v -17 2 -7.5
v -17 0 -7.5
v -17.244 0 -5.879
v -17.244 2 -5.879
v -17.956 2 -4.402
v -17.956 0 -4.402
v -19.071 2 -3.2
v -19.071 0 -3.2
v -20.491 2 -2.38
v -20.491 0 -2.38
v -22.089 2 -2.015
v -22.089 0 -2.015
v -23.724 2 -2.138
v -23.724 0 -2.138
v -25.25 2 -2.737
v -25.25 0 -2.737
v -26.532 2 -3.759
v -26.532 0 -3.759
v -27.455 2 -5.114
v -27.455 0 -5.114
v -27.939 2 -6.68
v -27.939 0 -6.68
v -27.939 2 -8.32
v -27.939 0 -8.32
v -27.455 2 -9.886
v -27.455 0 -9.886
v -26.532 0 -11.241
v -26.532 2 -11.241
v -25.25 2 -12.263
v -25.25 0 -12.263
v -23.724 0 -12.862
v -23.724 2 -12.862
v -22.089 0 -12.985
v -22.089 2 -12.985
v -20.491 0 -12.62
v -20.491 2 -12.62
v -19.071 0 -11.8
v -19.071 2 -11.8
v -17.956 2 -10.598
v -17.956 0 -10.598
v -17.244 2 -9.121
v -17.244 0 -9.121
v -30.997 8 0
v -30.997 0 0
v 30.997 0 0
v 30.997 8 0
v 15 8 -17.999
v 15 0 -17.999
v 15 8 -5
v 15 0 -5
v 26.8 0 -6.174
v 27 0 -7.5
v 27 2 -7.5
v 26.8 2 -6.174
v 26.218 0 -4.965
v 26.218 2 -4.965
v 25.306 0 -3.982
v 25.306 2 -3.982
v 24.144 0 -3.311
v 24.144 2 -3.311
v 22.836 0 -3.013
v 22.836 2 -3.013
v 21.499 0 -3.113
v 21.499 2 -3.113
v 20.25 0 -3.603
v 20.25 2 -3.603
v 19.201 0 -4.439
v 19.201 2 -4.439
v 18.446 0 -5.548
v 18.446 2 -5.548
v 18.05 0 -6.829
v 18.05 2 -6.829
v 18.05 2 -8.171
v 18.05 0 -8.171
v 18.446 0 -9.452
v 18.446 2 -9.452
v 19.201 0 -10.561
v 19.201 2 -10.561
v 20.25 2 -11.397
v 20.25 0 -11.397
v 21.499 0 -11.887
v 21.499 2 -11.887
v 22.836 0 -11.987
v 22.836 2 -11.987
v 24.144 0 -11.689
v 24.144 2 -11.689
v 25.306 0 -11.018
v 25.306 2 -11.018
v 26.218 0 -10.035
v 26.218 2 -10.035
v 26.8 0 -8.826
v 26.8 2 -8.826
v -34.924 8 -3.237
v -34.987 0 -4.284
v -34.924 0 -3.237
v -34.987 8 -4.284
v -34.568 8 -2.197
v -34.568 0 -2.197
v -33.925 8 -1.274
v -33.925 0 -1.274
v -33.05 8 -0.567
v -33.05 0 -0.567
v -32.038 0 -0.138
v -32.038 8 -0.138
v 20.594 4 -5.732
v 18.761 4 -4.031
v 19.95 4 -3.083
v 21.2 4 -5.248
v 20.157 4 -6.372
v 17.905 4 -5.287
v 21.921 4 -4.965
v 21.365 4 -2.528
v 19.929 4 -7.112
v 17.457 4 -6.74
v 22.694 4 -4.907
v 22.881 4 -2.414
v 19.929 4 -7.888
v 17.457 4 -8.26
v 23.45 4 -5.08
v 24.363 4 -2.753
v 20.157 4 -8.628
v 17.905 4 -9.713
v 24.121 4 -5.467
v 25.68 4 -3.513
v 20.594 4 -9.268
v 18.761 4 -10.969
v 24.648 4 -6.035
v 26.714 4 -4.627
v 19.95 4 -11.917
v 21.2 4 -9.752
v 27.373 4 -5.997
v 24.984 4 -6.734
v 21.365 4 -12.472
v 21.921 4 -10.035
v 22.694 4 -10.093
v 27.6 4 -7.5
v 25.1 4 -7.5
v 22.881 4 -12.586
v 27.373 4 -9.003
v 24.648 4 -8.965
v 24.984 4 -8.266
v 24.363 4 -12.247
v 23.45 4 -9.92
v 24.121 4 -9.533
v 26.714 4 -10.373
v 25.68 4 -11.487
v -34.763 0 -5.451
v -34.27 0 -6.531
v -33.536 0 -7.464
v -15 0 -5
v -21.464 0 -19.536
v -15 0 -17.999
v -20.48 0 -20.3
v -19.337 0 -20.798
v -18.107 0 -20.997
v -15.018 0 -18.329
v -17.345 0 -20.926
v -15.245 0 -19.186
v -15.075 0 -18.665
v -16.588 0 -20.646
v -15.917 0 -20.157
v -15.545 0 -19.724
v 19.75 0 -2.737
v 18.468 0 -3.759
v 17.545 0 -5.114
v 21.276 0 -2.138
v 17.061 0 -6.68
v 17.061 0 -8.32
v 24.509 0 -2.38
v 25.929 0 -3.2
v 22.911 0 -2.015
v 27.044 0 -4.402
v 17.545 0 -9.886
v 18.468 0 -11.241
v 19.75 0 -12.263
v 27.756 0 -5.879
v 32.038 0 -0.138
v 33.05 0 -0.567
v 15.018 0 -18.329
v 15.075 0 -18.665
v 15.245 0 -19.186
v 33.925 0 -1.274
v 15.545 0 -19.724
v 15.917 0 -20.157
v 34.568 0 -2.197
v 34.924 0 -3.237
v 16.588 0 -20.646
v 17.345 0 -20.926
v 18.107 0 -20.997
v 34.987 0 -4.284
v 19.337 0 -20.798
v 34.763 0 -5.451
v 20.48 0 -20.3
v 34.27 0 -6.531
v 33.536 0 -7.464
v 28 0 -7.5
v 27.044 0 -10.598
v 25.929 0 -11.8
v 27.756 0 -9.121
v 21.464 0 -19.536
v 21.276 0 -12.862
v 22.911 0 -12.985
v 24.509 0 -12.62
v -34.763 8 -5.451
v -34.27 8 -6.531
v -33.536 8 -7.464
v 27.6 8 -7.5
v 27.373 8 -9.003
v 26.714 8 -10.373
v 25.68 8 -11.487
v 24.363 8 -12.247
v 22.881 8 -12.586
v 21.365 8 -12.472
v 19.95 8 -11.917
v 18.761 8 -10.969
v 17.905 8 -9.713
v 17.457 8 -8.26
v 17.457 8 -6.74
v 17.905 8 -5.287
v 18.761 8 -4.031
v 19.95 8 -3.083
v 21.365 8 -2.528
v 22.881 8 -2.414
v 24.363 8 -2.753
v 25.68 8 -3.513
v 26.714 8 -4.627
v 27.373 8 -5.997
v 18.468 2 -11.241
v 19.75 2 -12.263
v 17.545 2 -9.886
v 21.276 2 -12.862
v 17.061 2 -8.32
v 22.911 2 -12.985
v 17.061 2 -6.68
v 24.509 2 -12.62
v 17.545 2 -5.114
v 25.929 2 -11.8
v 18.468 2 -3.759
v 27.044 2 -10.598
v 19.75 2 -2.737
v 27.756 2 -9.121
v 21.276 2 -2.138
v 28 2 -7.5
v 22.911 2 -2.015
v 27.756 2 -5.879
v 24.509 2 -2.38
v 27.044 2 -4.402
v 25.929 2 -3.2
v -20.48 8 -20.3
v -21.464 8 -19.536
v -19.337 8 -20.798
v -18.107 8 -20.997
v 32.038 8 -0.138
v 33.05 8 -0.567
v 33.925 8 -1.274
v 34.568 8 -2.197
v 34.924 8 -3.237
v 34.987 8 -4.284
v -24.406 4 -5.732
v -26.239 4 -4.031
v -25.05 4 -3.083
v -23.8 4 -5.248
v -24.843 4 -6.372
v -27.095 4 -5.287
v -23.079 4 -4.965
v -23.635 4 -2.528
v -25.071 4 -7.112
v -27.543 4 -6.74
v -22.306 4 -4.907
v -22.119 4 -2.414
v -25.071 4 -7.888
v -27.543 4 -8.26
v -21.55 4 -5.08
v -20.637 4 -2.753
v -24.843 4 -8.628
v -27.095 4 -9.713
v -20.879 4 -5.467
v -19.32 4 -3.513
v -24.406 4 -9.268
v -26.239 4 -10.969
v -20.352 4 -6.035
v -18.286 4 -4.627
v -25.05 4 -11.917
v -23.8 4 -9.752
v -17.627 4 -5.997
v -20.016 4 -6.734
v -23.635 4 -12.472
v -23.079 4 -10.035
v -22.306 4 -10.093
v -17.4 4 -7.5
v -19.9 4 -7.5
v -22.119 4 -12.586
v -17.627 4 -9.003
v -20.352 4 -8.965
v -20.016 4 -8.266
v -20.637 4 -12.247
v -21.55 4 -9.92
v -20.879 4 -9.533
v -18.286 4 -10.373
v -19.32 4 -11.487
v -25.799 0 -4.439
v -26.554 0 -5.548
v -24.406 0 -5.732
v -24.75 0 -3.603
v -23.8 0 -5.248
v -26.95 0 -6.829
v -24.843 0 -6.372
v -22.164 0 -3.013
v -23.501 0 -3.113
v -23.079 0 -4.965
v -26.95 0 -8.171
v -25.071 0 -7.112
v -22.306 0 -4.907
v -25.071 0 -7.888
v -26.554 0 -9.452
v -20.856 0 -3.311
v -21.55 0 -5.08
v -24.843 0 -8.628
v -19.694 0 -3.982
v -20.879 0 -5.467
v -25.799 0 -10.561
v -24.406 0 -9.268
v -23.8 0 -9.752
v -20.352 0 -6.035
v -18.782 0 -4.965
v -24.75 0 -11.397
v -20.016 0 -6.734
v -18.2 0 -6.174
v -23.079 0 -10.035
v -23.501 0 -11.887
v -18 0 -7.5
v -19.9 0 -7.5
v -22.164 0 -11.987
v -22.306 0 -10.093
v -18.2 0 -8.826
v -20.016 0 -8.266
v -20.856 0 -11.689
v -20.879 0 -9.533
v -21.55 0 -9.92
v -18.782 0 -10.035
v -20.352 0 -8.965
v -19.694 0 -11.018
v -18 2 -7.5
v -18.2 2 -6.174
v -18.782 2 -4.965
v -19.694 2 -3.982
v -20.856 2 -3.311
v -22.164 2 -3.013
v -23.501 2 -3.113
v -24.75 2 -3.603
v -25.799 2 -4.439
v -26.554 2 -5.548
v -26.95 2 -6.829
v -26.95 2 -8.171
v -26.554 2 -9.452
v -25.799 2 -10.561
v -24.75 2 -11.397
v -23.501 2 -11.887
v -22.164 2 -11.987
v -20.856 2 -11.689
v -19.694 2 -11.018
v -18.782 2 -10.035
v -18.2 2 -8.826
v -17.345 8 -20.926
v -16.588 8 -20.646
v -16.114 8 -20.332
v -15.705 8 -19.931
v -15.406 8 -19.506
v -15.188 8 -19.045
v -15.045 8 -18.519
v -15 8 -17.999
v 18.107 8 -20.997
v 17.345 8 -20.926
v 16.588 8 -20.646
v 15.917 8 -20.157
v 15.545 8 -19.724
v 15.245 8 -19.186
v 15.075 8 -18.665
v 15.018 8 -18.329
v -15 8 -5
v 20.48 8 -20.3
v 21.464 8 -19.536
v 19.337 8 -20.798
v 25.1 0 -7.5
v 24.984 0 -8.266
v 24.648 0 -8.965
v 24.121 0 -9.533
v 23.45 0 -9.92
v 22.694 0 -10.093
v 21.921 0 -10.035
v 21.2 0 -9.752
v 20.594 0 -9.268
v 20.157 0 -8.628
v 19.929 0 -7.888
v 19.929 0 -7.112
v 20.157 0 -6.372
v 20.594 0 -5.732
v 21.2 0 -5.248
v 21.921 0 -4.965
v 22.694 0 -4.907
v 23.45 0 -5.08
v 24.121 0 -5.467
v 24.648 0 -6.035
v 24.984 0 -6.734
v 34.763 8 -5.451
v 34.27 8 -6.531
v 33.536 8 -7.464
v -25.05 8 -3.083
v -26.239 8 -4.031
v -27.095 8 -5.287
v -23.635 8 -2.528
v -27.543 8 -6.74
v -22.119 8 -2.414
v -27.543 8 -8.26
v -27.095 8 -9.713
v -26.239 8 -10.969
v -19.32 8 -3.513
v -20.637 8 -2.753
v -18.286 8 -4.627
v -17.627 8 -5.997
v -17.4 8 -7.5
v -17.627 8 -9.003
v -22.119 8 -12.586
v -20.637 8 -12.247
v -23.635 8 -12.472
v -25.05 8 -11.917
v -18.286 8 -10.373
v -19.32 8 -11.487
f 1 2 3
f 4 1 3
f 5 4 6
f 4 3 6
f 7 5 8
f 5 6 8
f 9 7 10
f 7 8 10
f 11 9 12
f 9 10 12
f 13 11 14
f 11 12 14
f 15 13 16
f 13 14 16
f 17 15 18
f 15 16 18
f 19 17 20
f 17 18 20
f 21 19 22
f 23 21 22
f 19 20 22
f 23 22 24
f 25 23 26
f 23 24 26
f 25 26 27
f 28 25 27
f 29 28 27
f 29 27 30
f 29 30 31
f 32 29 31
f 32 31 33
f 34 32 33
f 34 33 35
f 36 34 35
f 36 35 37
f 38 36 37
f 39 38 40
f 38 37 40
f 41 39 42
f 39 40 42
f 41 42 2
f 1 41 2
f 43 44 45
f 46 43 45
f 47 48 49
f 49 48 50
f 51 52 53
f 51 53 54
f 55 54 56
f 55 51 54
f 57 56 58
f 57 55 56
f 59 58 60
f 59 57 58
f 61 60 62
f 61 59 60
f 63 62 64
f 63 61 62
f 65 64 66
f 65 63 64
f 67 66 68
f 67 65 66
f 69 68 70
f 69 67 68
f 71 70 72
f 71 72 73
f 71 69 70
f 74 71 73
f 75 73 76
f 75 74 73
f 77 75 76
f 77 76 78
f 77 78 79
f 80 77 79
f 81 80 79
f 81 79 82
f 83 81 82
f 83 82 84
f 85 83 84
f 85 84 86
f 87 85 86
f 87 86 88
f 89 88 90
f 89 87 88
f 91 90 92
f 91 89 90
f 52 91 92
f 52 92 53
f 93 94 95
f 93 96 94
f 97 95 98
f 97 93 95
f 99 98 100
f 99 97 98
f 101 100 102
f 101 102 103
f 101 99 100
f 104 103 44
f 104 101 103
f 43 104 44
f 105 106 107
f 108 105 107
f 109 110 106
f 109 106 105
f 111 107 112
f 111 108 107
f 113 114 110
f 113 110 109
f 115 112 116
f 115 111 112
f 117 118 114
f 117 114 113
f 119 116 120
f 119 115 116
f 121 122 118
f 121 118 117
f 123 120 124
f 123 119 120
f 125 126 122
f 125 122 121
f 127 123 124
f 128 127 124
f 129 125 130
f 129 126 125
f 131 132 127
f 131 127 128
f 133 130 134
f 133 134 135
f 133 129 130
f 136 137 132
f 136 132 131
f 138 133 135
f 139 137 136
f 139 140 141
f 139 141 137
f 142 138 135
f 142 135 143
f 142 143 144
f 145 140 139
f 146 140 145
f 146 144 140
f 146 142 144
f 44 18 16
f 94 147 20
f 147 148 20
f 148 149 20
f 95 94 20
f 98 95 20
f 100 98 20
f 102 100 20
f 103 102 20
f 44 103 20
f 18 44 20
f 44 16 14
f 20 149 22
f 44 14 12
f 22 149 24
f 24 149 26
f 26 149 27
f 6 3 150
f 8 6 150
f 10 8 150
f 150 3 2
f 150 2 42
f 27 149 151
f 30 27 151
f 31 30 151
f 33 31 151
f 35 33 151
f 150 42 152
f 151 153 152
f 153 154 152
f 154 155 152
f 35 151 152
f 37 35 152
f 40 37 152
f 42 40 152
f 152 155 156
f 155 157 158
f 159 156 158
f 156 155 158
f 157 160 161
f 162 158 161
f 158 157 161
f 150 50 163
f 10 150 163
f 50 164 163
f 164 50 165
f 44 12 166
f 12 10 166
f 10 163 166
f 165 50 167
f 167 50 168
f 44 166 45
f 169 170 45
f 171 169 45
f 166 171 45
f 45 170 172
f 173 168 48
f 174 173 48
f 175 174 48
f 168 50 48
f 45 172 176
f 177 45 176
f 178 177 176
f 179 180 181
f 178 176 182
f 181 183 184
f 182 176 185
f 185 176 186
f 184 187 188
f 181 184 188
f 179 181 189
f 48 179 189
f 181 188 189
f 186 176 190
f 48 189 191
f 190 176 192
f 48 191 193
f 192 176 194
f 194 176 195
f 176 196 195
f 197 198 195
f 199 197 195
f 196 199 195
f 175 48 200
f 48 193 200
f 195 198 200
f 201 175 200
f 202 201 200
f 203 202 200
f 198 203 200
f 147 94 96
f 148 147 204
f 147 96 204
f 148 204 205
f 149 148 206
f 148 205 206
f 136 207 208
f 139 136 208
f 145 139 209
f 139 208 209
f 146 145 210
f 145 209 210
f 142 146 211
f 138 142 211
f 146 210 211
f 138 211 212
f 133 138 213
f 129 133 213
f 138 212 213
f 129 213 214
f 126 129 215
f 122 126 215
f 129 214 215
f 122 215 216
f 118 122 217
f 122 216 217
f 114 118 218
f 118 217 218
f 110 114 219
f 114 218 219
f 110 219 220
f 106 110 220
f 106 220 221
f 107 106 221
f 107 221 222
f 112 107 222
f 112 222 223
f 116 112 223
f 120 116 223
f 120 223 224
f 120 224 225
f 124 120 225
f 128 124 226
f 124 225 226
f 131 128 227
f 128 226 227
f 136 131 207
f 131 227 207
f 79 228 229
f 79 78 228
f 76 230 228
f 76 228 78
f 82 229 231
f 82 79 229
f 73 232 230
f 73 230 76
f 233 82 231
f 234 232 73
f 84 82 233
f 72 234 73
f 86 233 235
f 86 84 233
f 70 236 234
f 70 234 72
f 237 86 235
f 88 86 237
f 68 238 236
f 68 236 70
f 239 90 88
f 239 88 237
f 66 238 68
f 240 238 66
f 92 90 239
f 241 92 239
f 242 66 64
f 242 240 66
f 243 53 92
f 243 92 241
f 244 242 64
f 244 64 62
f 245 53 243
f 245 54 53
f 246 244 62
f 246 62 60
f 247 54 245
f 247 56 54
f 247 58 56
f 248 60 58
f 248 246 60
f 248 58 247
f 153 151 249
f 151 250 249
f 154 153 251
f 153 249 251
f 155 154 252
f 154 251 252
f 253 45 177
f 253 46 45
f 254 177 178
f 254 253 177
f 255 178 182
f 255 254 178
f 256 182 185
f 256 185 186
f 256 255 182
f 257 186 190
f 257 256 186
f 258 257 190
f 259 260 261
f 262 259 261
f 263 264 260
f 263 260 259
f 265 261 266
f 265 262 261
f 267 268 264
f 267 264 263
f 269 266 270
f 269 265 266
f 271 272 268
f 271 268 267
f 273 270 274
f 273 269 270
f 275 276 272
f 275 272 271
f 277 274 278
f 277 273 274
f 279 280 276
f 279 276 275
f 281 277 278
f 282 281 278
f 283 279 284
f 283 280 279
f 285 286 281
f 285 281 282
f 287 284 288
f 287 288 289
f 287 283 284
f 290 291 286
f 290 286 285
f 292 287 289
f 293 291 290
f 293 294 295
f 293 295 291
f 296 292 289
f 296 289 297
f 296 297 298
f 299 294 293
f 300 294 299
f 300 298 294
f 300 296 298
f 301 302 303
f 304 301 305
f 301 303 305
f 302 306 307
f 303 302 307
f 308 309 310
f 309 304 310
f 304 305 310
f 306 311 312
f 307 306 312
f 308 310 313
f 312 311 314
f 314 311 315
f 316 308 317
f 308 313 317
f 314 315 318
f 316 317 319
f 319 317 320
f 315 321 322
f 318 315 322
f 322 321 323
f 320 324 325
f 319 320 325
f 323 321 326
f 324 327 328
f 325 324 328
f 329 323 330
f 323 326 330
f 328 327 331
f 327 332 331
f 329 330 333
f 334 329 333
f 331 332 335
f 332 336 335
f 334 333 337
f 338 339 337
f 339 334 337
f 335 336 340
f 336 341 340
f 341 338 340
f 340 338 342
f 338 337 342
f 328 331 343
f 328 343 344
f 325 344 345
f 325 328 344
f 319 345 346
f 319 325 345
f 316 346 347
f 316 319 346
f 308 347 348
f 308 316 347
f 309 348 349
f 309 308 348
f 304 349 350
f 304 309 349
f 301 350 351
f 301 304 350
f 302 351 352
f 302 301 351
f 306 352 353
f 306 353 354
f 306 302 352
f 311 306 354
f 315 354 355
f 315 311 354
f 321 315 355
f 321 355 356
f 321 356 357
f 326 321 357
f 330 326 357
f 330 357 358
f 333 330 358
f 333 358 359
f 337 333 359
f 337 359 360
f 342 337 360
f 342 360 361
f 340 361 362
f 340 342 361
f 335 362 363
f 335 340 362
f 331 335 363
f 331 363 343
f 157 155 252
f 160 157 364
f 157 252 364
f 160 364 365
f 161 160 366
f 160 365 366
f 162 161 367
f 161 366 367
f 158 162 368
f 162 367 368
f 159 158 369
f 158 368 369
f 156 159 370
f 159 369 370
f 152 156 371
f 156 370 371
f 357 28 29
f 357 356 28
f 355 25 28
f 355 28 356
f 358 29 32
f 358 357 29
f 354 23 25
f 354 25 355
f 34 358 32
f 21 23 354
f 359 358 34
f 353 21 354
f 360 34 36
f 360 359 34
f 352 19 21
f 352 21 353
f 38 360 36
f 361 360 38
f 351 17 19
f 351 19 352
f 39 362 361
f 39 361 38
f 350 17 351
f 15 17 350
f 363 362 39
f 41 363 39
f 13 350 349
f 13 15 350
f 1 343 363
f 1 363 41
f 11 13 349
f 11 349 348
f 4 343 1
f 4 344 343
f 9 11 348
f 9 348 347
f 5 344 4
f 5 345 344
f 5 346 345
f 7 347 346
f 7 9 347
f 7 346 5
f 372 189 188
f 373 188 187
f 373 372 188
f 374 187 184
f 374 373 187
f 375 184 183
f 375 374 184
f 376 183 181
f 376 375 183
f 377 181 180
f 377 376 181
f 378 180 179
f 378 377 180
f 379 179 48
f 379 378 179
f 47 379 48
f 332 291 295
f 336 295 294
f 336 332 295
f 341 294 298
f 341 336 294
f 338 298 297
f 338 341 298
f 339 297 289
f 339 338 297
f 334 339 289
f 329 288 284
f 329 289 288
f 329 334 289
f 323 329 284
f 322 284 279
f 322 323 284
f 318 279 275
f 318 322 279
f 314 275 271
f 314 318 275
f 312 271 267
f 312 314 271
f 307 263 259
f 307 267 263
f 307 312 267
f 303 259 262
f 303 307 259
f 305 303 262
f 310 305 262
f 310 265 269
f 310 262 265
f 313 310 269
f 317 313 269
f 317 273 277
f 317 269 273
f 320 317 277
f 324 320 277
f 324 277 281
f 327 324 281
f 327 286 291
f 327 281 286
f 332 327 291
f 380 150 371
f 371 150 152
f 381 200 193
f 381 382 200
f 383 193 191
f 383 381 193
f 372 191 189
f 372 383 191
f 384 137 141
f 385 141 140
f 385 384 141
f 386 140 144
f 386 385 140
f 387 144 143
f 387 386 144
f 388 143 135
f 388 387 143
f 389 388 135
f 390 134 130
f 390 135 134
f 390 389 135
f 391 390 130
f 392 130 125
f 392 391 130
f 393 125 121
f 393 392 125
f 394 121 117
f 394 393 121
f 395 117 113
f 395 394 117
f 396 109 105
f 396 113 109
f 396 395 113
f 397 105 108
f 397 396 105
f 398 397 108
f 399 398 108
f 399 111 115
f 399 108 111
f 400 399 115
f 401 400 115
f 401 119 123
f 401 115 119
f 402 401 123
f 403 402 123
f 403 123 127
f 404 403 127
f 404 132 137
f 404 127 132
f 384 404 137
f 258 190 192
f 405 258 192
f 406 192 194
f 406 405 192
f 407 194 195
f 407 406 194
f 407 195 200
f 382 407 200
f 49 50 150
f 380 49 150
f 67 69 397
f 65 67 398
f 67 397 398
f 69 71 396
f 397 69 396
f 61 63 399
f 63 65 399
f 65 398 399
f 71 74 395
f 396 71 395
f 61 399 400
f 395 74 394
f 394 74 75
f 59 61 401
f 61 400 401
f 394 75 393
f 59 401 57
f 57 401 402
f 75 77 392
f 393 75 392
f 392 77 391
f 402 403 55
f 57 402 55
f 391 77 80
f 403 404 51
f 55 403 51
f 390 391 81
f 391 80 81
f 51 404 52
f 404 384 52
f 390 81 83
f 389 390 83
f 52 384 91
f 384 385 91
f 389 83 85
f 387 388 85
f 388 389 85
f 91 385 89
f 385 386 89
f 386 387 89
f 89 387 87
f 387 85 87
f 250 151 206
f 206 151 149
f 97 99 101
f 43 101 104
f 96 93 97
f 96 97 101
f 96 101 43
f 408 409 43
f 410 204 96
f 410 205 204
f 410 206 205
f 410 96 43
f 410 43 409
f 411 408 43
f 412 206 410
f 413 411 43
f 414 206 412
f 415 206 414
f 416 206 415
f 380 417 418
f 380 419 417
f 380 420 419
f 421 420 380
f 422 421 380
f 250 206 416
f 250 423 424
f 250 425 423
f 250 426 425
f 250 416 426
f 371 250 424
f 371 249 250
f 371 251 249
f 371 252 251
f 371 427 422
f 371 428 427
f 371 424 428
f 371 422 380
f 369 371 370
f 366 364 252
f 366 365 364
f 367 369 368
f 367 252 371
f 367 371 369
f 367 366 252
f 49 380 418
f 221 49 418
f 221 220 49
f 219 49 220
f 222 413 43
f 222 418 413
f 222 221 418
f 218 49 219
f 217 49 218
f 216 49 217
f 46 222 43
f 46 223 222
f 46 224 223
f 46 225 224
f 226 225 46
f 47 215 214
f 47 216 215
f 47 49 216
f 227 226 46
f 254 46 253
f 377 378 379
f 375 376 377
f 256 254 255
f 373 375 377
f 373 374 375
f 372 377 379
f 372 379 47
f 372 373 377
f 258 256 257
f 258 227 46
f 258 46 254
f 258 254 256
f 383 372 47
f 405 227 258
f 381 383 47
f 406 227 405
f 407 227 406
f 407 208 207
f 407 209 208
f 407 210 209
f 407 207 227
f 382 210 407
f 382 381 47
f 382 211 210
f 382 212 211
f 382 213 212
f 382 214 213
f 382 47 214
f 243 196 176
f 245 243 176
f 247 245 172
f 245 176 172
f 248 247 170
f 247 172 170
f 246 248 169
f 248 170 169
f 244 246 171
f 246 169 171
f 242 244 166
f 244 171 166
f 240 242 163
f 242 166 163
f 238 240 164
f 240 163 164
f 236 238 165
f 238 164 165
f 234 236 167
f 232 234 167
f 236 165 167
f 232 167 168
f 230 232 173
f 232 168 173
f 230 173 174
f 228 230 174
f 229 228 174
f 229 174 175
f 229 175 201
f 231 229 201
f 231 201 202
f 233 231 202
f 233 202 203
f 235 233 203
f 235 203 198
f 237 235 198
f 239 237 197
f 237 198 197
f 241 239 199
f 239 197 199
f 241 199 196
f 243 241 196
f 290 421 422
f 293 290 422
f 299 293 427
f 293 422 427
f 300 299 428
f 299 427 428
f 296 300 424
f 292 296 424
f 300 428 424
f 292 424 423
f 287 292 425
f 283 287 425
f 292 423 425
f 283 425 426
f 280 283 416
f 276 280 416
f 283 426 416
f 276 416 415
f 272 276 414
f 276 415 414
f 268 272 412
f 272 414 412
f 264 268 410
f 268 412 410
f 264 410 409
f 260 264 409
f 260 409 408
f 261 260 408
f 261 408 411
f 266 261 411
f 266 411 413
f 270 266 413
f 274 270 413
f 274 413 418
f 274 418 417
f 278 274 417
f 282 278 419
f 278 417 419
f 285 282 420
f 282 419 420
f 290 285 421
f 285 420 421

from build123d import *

# Parameters (mm, degrees)
ESQUISSE1_R             = 2.6
BOSS_EXTRU_1_DEPTH      = 8
ESQUISSE3_R             = 5.1
ENL_V_MAT_EXTRU_2_DEPTH = 4
ESQUISSE4_R             = 5.5
ESQUISSE4_R_2           = 4.5
ENL_V_MAT_EXTRU_3_DEPTH = 2
CONG_1_R                = 5
CONG_2_R                = 3
CONG_3_R                = 4


with BuildPart() as part:
    # Esquisse1 → Boss.-Extru.1 (new body)
    with BuildSketch(Plane(origin=(0, 0, 0), x_dir=(1, 0, 0), z_dir=(0, 1, 0))):
        Polygon((-35, 0), (35, 0), (35, 6), (20, 21), (15, 21), (15, 5), (-15, 5), (-15, 21), (-20, 21), (-35, 6), align=None)
        with Locations((22.5, 7.5)):
            Circle(ESQUISSE1_R, mode=Mode.SUBTRACT)
        with Locations((-22.5, 7.5)):
            Circle(ESQUISSE1_R, mode=Mode.SUBTRACT)
    extrude(amount=BOSS_EXTRU_1_DEPTH)

    # Esquisse3 → Enlèv. mat.-Extru.2 (cut)
    with BuildSketch(Plane(origin=(0, 8, 0), x_dir=(1, 0, 0), z_dir=(0, 1, 0))):
        with Locations((-22.5, 7.5)):
            Circle(ESQUISSE3_R)
        with Locations((22.5, 7.5)):
            Circle(ESQUISSE3_R)
    extrude(amount=-ENL_V_MAT_EXTRU_2_DEPTH, mode=Mode.SUBTRACT)

    # Esquisse4 → Enlèv. mat.-Extru.3 (cut)
    with BuildSketch(Plane.XZ):
        with Locations((-22.5, -7.5)):
            Circle(ESQUISSE4_R)
        with Locations((-22.5, -7.5)):
            Circle(ESQUISSE4_R_2, mode=Mode.SUBTRACT)
        with Locations((22.5, -7.5)):
            Circle(ESQUISSE4_R)
        with Locations((22.5, -7.5)):
            Circle(ESQUISSE4_R_2, mode=Mode.SUBTRACT)
    extrude(amount=-ENL_V_MAT_EXTRU_3_DEPTH, mode=Mode.SUBTRACT)

    # Congé1
    cong_1_edges = [part.edges().sort_by_distance(p)[0] for p in [
        (-35, 4, -6),
        (-20, 4, -21),
        (20, 4, -21),
        (35, 4, -6),
    ]]
    fillet(cong_1_edges, radius=CONG_1_R)

    # Congé2
    cong_2_edges = [part.edges().sort_by_distance(p)[0] for p in [
        (-15, 4, -21),
        (15, 4, -21),
    ]]
    fillet(cong_2_edges, radius=CONG_2_R)

    # Congé3
    cong_3_edges = [part.edges().sort_by_distance(p)[0] for p in [
        (-35, 4, 0),
        (35, 4, 0),
    ]]
    fillet(cong_3_edges, radius=CONG_3_R)


solid = part.part
